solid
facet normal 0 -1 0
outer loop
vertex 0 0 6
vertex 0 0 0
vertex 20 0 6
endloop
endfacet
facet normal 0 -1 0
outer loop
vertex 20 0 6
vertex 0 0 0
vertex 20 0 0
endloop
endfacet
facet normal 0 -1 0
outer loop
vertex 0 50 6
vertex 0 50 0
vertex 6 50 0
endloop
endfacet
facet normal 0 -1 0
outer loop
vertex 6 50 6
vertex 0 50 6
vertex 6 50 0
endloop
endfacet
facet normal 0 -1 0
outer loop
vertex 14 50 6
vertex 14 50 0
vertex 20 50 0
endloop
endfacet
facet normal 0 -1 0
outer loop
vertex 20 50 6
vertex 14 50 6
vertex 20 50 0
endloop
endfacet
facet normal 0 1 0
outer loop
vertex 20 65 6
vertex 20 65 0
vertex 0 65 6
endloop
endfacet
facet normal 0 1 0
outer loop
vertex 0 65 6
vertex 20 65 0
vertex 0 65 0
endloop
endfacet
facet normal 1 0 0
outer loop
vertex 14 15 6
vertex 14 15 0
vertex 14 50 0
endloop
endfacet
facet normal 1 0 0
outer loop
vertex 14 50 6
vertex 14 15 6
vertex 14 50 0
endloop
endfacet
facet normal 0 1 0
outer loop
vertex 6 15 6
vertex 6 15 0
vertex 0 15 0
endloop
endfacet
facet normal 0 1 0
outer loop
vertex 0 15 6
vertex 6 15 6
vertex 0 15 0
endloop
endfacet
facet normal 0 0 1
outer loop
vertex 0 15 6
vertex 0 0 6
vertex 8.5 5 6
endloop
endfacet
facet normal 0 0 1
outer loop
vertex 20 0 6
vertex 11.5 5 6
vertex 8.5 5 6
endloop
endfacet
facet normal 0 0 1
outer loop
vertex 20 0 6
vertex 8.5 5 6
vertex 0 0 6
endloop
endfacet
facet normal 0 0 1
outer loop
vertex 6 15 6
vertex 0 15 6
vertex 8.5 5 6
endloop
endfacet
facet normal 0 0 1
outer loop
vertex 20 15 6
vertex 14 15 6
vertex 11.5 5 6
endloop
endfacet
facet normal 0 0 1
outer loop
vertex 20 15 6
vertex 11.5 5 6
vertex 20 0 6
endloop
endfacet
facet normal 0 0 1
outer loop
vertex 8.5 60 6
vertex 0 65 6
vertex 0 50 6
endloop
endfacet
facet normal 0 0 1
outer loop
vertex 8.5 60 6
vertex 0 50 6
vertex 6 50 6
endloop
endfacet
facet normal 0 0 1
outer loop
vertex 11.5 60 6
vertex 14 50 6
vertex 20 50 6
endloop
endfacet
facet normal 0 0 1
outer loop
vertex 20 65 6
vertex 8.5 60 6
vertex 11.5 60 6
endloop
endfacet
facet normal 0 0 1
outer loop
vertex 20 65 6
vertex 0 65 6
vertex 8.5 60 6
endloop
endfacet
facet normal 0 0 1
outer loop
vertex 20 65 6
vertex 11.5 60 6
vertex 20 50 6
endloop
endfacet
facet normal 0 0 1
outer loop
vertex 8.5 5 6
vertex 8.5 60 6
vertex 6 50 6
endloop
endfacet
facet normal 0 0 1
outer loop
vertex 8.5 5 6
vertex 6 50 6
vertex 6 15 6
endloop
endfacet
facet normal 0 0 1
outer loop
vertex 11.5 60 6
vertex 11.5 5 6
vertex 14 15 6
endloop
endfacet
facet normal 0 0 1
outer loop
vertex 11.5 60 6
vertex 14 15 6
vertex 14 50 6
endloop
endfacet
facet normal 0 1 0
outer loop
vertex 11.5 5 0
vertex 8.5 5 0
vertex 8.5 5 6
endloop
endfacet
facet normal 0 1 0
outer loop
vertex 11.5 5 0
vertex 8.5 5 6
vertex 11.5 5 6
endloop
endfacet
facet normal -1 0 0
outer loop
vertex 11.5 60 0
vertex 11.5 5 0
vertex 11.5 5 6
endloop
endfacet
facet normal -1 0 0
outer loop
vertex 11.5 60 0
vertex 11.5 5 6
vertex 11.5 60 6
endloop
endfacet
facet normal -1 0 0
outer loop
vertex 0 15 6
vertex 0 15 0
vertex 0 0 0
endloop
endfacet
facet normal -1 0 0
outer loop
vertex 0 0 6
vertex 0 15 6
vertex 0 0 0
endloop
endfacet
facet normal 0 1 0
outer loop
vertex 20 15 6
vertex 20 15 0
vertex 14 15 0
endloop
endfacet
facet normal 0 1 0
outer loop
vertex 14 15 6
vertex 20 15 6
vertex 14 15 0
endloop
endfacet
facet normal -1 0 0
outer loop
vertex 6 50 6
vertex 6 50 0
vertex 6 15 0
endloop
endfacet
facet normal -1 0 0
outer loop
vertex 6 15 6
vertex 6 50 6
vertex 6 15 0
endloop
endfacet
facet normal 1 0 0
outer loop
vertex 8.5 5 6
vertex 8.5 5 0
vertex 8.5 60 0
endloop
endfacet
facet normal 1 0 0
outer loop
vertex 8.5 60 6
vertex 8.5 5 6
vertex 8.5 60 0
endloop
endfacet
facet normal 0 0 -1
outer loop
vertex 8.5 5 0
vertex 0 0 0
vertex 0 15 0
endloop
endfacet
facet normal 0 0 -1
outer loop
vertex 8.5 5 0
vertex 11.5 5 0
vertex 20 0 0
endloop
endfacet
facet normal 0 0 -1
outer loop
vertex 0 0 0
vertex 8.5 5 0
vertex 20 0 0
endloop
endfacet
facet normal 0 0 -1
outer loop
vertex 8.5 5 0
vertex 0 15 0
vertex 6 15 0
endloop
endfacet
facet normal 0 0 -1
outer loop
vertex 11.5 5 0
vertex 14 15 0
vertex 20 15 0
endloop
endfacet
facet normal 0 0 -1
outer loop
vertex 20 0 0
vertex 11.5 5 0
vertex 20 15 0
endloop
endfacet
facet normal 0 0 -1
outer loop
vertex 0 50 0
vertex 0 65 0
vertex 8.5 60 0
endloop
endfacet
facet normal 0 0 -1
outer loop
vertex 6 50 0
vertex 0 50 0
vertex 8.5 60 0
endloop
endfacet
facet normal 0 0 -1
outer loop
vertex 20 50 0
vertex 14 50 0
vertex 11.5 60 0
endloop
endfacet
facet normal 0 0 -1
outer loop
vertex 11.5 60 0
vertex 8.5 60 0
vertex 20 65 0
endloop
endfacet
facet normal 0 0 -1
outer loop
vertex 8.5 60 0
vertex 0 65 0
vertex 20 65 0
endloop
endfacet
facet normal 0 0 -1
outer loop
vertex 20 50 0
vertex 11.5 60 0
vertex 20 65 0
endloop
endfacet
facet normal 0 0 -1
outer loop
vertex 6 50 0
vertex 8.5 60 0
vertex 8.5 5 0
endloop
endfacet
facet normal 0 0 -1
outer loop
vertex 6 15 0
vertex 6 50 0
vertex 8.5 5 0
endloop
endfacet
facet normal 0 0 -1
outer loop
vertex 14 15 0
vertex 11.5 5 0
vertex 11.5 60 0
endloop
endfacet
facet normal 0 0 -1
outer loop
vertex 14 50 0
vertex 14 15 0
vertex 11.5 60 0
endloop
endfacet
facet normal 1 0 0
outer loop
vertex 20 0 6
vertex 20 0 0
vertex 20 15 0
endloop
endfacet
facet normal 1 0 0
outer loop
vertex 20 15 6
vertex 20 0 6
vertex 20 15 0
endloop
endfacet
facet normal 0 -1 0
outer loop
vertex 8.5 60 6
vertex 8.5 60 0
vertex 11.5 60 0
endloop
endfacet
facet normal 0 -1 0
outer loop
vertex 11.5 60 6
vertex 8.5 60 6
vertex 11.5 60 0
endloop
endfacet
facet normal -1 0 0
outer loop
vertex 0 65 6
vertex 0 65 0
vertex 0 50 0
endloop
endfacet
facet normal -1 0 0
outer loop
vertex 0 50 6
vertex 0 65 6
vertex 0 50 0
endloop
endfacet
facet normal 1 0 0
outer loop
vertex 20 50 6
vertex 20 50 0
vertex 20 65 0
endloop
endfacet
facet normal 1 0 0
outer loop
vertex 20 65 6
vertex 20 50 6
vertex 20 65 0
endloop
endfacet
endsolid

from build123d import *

# Parameters (mm, degrees)
SKETCH1_W           = 3
SKETCH1_H           = 55
BOSS_EXTRUDE1_DEPTH = 6


with BuildPart() as part:
    # Sketch1 → Boss-Extrude1 (new body)
    with BuildSketch(Plane.XY):
        Polygon((0, 0), (20, 0), (20, 15), (14, 15), (14, 50), (20, 50), (20, 65), (0, 65), (0, 50), (6, 50), (6, 15), (0, 15), align=None)
        with Locations((10, 32.5)):
            Rectangle(SKETCH1_W, SKETCH1_H, mode=Mode.SUBTRACT)
    extrude(amount=BOSS_EXTRUDE1_DEPTH)


solid = part.part
